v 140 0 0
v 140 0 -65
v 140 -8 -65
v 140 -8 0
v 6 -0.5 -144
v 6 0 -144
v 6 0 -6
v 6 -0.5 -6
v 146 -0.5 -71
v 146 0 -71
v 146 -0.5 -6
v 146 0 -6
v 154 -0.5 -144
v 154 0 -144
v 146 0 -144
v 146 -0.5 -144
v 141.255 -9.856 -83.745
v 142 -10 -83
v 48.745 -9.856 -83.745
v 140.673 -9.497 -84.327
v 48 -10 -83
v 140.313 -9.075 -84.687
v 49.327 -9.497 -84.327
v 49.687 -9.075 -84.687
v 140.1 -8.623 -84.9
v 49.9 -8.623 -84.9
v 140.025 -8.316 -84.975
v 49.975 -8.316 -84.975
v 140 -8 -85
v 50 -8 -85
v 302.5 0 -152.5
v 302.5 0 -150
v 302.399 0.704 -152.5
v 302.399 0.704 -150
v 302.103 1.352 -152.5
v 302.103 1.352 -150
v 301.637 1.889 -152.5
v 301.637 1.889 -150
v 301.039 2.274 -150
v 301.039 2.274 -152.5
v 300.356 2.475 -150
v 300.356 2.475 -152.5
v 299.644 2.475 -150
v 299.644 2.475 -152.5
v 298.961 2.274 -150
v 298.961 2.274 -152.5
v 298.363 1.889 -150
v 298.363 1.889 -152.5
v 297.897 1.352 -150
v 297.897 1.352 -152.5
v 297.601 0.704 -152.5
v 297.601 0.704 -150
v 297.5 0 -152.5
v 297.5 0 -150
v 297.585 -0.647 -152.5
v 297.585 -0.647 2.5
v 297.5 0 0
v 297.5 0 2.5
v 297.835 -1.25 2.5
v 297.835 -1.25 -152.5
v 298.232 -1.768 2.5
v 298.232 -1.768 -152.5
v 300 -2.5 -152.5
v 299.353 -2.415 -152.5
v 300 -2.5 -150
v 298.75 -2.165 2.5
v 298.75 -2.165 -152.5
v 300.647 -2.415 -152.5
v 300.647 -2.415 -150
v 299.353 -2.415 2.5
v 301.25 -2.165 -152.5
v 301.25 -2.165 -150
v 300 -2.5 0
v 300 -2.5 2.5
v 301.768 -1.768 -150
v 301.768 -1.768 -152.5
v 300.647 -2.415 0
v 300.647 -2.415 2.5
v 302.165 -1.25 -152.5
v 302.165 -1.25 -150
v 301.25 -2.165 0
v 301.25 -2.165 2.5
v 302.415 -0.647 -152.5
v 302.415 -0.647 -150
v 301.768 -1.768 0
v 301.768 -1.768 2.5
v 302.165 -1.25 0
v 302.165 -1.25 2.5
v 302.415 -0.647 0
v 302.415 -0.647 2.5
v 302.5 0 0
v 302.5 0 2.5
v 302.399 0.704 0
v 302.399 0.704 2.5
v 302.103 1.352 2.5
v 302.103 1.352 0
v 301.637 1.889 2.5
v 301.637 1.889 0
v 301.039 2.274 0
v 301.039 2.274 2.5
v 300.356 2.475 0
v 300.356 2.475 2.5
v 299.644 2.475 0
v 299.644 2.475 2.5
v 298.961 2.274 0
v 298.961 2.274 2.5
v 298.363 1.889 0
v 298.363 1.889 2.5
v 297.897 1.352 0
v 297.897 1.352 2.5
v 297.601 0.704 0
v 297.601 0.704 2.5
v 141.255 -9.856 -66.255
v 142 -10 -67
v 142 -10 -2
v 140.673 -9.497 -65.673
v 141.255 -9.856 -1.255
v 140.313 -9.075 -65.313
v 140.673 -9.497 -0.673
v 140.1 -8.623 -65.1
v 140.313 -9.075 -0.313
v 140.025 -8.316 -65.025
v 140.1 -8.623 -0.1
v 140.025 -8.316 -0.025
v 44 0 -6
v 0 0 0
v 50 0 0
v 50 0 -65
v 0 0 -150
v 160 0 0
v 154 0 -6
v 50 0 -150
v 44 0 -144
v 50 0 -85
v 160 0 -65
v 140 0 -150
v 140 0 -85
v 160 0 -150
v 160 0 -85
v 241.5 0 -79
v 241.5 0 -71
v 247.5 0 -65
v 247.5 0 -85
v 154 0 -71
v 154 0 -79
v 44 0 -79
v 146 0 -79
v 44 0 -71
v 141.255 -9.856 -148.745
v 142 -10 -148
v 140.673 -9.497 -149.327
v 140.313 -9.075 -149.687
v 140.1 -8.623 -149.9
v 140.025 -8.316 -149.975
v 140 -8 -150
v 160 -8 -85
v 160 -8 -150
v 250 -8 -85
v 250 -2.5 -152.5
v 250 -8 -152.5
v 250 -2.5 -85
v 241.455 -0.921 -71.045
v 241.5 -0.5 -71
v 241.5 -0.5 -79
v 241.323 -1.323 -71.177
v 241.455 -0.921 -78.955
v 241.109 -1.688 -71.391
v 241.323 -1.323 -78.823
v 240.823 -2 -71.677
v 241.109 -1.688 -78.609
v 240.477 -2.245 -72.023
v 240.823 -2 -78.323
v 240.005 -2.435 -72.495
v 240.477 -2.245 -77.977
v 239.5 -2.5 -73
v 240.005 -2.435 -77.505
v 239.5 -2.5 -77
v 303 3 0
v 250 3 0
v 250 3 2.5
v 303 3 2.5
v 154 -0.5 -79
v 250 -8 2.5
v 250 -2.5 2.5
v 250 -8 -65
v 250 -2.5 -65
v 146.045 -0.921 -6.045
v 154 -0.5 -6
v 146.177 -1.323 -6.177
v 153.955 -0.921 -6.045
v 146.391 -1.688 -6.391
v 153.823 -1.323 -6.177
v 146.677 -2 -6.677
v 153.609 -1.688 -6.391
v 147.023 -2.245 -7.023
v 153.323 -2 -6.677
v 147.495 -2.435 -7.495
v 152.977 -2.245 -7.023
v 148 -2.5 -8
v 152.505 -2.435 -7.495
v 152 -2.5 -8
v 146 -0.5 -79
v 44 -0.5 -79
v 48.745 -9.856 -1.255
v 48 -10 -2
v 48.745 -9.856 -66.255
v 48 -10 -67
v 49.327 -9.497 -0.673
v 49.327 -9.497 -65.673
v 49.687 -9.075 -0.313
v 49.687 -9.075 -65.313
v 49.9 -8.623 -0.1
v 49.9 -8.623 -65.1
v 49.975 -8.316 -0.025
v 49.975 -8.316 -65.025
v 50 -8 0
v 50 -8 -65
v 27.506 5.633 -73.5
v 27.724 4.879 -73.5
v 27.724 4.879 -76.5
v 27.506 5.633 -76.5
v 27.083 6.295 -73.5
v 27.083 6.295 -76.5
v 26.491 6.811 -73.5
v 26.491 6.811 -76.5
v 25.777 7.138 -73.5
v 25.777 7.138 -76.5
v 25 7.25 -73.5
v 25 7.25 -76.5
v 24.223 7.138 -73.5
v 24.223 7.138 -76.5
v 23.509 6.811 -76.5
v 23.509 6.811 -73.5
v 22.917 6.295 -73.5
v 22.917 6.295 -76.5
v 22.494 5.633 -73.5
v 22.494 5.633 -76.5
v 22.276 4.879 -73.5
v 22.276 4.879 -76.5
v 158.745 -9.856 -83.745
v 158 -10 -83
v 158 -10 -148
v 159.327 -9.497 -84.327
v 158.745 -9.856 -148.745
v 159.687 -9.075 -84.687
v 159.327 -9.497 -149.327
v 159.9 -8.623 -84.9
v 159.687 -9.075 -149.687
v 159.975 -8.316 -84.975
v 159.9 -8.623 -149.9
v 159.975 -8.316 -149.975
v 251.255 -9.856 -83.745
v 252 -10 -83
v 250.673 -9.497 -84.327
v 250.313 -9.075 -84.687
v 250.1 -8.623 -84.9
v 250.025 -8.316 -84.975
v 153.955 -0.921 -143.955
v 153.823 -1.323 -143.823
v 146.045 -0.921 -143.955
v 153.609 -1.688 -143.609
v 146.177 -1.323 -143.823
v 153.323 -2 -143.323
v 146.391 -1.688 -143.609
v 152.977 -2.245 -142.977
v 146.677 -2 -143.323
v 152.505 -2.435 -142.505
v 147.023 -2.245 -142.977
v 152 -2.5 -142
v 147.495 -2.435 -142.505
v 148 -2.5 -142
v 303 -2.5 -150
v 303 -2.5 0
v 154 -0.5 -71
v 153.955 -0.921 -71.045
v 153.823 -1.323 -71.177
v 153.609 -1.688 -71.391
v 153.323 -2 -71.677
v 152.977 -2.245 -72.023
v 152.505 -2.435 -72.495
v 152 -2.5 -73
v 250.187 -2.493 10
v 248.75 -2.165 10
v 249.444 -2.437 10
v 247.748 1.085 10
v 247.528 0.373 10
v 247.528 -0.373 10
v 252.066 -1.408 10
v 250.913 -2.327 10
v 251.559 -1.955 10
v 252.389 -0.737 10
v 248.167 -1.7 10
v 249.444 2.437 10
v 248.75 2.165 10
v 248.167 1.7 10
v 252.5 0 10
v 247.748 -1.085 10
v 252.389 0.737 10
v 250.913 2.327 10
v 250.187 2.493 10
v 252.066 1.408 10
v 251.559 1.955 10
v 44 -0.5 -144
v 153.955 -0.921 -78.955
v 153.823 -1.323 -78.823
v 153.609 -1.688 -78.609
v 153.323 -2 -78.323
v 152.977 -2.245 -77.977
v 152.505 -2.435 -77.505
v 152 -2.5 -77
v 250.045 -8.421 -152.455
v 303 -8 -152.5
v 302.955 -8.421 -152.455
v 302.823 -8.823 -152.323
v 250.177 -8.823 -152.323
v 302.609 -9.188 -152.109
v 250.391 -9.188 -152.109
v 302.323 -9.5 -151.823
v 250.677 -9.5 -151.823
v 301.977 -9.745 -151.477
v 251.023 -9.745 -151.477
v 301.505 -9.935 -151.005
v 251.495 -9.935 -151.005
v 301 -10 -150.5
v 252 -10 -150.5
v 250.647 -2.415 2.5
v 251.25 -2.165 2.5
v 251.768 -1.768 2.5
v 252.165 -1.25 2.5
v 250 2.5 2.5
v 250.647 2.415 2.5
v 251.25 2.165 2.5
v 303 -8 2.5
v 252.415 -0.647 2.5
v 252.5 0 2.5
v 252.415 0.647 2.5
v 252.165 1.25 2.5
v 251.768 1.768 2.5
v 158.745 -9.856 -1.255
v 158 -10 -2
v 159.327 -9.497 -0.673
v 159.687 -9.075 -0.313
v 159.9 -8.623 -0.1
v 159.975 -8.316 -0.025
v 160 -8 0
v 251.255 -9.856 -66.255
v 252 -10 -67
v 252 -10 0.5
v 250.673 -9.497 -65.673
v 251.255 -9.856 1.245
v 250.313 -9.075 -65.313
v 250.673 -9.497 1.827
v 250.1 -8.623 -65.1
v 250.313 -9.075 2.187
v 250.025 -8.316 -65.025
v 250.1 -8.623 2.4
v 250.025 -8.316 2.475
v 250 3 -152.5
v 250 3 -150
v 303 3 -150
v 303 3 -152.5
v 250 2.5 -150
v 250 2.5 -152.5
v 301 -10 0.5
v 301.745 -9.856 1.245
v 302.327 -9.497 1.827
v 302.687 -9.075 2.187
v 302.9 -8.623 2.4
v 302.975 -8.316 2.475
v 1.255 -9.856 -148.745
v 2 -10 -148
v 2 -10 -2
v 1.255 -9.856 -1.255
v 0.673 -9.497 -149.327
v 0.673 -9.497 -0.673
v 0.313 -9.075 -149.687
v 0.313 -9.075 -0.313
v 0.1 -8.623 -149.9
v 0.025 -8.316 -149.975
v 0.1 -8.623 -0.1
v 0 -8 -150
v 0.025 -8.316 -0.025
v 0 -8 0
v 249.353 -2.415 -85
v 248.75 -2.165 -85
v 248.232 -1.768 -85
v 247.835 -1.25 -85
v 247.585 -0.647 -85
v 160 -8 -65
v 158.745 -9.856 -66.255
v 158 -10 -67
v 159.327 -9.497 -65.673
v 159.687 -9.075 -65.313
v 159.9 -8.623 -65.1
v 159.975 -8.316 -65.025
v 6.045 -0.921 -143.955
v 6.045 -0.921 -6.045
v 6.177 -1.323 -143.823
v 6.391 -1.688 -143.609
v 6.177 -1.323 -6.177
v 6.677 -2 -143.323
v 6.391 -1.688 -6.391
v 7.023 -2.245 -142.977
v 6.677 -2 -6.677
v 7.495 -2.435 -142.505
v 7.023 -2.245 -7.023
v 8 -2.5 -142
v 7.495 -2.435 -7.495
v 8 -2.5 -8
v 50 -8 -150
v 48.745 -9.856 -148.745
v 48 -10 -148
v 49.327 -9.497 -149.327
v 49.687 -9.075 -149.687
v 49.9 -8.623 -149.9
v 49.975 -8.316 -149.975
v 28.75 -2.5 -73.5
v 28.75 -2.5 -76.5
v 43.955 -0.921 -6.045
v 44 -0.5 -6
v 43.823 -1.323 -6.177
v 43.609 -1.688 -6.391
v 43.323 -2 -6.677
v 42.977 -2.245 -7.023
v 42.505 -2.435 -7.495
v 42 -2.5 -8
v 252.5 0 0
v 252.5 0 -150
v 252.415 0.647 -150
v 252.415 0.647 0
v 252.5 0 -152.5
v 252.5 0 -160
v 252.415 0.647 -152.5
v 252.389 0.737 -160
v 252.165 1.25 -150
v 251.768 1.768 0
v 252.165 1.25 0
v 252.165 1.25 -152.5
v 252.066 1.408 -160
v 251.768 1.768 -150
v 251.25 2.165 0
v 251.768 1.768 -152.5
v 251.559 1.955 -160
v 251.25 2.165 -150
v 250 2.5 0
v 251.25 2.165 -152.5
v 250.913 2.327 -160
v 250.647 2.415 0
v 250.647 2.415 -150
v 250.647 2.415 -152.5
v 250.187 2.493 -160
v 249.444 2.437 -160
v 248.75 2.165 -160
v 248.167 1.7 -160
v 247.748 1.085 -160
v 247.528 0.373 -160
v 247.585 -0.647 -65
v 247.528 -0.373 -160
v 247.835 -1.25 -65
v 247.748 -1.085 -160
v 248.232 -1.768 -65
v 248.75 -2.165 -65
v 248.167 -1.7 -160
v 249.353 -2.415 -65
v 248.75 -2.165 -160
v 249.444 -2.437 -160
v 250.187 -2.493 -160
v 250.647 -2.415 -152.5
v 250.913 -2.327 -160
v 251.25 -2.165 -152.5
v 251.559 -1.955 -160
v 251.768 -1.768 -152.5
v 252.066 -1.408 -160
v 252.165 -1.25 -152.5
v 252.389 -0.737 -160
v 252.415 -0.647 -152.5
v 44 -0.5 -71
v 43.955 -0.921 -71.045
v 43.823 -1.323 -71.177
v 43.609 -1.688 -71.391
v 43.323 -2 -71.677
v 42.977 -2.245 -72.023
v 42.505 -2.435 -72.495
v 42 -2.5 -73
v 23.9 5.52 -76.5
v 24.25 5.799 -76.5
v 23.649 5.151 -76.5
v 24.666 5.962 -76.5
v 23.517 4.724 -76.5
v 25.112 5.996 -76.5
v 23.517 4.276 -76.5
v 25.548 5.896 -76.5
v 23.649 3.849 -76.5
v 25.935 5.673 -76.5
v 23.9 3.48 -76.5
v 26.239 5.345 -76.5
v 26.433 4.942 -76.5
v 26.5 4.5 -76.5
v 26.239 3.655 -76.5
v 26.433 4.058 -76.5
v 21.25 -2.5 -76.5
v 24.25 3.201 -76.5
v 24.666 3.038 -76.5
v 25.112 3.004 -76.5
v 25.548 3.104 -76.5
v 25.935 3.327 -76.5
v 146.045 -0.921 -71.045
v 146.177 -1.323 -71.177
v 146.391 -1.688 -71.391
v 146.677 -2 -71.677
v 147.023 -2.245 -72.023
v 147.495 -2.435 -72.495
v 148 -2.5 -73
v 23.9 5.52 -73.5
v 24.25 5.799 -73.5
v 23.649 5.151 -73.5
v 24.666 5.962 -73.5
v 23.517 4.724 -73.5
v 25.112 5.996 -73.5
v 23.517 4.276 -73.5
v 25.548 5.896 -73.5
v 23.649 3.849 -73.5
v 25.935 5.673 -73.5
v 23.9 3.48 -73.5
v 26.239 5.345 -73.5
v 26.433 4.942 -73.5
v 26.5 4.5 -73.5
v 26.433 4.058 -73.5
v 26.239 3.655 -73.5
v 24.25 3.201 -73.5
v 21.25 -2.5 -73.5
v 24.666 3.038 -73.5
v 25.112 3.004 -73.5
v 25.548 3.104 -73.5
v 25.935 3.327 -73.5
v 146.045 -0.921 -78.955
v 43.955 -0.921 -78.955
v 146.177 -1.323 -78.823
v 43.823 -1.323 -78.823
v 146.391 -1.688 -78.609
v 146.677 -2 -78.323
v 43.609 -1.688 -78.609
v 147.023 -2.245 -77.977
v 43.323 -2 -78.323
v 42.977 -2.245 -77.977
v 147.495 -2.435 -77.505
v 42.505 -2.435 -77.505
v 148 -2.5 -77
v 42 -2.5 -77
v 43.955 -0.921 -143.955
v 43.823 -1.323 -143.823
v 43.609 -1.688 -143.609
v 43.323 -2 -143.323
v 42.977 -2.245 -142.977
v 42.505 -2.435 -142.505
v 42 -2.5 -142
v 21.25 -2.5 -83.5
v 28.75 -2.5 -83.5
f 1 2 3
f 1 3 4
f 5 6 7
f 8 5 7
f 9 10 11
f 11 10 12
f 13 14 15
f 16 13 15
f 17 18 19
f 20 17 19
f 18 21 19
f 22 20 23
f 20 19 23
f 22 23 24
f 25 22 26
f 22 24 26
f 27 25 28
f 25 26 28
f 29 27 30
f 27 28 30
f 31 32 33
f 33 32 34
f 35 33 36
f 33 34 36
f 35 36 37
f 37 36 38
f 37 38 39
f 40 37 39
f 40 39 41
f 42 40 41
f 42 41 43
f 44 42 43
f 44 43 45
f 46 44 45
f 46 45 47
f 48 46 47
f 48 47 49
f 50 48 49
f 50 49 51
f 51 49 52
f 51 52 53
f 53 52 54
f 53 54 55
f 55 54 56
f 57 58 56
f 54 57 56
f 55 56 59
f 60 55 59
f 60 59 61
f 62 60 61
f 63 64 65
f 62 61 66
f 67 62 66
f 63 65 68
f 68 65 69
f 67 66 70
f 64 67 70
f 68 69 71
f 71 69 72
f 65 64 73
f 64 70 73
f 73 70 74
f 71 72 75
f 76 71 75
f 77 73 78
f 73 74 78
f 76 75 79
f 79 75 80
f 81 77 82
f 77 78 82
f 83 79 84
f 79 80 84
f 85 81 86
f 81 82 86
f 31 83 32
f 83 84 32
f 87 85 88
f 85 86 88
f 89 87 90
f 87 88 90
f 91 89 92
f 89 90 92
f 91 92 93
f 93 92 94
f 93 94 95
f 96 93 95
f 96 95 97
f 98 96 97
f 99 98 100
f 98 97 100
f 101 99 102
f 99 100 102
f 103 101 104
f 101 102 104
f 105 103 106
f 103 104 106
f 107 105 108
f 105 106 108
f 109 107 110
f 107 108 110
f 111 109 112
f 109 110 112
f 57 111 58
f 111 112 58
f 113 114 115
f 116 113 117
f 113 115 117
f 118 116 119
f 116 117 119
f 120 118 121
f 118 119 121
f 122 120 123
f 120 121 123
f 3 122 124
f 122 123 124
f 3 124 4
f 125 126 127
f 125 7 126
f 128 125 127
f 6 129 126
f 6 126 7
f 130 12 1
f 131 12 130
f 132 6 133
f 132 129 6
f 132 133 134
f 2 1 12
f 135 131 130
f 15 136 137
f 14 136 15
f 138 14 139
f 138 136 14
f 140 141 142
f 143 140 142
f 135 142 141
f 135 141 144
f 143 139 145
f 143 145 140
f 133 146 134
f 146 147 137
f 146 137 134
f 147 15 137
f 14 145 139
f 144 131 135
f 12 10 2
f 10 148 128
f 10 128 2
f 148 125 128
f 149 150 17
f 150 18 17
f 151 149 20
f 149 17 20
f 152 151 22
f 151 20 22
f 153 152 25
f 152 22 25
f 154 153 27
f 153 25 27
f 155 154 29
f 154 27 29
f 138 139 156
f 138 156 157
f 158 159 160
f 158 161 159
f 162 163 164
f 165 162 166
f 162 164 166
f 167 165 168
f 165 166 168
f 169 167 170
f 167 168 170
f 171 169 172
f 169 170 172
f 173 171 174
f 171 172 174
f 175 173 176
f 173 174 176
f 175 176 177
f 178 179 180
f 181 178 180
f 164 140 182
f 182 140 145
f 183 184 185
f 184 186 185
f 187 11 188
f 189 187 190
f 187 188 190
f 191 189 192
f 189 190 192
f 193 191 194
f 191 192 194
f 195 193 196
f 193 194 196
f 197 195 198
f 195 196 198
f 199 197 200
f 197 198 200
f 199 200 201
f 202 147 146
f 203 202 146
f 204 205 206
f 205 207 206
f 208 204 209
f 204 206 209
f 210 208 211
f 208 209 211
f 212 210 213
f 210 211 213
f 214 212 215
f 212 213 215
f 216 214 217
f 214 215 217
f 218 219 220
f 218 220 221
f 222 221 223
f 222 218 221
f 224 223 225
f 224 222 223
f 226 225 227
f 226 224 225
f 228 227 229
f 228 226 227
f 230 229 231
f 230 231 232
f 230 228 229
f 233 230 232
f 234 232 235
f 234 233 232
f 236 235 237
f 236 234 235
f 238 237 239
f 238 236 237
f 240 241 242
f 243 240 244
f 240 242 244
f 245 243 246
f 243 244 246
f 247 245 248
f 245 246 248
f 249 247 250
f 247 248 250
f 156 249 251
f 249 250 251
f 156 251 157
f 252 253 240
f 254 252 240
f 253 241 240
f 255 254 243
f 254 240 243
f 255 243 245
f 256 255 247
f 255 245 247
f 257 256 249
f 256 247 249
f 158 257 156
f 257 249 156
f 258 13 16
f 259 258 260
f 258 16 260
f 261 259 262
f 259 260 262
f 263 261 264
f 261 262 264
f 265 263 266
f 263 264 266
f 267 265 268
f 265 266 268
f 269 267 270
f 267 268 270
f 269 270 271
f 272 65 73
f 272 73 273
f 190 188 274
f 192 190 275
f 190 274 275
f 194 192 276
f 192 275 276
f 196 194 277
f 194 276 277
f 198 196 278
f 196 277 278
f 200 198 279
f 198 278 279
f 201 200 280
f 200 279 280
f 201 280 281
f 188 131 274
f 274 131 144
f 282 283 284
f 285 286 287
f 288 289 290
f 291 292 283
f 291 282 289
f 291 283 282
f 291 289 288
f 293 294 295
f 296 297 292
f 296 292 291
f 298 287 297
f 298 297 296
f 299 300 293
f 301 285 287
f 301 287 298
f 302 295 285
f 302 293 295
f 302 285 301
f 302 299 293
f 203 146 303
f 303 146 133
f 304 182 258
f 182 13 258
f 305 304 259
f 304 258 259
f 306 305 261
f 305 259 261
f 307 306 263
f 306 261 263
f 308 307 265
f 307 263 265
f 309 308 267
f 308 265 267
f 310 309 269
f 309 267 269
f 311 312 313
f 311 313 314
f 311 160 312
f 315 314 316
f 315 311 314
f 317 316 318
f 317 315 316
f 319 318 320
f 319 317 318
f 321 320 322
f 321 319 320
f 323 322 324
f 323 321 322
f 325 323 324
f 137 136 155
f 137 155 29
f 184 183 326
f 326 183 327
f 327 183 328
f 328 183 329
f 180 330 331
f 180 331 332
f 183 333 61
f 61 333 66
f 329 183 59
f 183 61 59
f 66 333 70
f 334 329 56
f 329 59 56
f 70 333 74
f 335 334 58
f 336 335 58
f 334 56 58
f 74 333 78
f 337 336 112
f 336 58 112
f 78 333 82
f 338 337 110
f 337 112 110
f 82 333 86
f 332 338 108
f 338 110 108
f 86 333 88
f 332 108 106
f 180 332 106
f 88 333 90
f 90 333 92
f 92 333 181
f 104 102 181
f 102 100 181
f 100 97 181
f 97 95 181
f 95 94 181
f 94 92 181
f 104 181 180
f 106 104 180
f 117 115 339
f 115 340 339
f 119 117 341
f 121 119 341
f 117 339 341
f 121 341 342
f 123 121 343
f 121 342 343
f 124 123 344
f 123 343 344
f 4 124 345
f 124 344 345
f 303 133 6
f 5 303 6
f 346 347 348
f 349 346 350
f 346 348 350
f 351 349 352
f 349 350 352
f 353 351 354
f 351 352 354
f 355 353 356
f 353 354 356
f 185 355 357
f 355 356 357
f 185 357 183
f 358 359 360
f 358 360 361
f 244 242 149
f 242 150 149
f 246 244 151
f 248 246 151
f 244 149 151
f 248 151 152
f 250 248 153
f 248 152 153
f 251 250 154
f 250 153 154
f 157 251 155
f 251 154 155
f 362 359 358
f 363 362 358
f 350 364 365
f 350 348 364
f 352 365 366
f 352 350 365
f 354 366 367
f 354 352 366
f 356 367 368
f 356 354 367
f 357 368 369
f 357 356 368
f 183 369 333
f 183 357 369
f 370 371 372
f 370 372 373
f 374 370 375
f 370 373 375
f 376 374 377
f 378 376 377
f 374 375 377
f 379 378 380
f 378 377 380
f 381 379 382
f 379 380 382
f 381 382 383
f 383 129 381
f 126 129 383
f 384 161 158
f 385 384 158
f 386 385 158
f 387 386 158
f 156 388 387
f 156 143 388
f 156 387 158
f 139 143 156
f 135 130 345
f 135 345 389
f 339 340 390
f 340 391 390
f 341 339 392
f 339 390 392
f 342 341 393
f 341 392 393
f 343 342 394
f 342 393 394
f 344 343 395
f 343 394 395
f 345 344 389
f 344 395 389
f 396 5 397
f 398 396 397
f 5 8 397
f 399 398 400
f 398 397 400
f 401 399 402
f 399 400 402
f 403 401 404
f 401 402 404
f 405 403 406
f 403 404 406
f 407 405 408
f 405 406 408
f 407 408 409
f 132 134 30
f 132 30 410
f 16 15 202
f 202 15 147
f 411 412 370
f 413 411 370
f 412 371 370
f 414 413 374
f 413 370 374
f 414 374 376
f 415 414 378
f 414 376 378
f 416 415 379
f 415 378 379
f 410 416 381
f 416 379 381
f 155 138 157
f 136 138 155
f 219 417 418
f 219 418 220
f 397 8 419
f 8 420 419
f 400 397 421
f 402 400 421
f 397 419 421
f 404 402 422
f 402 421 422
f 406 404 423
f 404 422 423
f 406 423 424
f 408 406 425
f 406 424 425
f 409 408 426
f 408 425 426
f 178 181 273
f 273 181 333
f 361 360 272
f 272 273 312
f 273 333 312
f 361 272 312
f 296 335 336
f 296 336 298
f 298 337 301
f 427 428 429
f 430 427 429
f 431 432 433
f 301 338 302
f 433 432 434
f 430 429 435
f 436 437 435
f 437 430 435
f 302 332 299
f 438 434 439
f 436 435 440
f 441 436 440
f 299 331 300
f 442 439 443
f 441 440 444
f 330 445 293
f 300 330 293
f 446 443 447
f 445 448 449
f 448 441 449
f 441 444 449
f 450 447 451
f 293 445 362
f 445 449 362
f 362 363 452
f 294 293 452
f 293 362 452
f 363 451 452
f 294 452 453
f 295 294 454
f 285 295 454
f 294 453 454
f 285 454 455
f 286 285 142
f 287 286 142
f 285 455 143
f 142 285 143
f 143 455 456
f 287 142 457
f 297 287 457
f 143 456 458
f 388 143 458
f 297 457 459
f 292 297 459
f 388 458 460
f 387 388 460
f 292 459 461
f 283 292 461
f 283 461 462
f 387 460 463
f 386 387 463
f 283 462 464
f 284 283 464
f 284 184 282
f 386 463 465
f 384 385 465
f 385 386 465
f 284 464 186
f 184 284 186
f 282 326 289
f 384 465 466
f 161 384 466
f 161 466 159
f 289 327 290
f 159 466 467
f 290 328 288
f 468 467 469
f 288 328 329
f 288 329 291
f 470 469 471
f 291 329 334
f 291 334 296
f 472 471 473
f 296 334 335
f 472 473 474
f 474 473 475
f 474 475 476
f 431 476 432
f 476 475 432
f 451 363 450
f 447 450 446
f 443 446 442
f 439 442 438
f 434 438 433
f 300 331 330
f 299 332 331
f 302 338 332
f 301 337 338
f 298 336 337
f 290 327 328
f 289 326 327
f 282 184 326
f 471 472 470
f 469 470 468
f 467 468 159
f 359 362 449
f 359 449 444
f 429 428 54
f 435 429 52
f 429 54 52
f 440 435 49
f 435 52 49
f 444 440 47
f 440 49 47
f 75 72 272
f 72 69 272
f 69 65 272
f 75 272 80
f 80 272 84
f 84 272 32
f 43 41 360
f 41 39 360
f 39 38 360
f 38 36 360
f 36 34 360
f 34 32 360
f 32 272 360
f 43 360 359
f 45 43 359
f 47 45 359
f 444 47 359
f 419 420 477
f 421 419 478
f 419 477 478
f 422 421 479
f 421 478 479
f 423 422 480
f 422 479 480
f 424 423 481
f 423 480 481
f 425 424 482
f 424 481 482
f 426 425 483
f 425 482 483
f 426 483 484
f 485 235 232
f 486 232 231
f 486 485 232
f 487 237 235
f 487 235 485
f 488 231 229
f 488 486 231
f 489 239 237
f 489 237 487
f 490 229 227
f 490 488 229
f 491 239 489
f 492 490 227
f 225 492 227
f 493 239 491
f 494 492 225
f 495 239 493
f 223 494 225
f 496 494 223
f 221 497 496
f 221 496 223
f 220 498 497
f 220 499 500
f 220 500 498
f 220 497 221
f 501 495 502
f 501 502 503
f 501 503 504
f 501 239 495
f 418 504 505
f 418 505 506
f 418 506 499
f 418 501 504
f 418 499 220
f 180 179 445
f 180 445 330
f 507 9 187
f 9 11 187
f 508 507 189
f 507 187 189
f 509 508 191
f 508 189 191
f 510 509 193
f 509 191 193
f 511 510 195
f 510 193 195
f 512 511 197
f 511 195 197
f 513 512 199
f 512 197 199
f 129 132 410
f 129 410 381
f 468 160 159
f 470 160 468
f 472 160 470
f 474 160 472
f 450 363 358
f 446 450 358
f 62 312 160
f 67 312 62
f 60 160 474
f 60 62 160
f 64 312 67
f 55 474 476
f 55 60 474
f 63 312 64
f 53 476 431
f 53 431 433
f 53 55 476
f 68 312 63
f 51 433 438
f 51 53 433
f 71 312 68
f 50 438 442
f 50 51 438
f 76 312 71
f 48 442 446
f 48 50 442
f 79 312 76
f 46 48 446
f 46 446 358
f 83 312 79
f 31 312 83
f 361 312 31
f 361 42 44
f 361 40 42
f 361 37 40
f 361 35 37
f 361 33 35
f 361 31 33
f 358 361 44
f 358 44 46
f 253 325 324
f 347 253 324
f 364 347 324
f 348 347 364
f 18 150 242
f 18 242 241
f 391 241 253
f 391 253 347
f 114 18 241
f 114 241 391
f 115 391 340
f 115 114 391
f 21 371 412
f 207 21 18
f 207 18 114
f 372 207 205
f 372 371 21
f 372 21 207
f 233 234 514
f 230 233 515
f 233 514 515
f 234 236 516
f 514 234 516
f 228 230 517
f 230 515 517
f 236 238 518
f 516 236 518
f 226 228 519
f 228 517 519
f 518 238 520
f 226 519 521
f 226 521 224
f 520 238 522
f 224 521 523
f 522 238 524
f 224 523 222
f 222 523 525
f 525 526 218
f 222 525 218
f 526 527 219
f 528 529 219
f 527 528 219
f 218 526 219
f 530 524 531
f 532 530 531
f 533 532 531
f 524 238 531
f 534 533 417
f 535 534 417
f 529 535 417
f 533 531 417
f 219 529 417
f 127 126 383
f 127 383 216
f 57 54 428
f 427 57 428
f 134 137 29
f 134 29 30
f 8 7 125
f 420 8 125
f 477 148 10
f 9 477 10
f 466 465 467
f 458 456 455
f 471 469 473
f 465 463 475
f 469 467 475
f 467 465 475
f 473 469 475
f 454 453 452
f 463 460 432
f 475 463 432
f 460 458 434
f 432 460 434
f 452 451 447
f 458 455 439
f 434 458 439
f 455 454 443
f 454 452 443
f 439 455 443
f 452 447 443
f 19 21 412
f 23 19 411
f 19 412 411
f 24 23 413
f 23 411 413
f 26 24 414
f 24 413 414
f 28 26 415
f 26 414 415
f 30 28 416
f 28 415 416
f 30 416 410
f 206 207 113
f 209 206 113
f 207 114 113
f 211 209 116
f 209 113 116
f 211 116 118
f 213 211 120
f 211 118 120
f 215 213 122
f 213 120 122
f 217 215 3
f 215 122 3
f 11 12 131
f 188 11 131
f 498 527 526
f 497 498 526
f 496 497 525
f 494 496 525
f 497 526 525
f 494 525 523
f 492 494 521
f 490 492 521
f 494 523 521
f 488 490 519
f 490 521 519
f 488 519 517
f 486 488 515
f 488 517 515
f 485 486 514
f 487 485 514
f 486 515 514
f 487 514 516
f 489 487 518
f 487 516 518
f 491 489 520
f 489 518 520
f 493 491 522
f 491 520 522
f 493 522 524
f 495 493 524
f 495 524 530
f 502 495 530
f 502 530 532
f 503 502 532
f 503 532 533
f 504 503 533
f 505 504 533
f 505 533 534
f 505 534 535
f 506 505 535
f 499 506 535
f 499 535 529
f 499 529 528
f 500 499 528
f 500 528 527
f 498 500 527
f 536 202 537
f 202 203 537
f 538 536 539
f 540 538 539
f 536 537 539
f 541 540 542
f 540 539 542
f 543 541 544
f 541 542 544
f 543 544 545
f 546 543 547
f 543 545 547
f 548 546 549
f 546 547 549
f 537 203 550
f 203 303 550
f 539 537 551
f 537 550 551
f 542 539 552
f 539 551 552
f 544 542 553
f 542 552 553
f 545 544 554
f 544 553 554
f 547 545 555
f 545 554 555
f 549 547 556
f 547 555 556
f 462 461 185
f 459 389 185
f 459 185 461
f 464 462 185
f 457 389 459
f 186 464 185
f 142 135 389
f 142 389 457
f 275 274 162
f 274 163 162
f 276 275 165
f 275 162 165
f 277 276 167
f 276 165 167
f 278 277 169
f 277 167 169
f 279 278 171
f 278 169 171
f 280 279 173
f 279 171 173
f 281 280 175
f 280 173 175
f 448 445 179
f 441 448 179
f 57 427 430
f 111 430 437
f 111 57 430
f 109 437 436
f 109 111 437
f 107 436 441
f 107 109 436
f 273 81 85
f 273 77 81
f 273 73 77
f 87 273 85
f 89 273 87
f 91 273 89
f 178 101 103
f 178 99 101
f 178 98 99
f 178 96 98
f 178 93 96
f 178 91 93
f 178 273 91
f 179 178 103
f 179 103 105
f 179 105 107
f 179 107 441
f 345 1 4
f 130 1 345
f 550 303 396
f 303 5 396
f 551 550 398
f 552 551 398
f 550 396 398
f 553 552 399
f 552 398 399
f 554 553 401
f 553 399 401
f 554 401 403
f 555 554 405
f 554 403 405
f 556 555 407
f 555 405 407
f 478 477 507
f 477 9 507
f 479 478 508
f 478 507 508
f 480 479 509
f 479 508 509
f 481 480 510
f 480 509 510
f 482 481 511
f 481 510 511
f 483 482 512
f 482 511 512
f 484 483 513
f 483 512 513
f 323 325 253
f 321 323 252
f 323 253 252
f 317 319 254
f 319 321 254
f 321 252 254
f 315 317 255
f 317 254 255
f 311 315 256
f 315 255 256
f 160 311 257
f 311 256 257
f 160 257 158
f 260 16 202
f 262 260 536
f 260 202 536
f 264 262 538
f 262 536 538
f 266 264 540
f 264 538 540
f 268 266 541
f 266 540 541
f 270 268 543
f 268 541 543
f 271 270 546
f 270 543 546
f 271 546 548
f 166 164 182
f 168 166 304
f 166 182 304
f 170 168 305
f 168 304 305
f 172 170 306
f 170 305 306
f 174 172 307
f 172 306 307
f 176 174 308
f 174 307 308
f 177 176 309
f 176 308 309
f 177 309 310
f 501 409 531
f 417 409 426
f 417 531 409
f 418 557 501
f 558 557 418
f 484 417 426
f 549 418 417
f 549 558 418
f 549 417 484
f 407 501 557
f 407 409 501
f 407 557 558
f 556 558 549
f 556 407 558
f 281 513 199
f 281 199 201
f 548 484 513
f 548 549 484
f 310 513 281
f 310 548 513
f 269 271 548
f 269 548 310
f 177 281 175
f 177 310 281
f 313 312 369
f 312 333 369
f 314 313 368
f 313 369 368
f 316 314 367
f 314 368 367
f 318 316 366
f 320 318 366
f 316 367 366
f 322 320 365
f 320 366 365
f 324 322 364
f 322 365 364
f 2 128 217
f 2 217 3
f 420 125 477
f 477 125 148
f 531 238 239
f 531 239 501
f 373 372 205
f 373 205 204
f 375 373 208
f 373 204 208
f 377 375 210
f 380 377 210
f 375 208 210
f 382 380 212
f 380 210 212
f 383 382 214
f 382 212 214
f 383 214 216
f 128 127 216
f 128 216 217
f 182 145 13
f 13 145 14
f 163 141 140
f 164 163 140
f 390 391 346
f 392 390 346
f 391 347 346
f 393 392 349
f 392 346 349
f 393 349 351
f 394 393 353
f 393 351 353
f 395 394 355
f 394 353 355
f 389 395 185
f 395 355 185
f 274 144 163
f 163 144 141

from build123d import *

# Parameters (mm, degrees)
BOSS_EXTRUDE1_DEPTH      = 10
BOSS_EXTRUDE2_DEPTH      = 10
BOSS_EXTRUDE2_DEPTH_BACK = 160
SKETCH4_R                = 2.5
CUT_EXTRUDE2_DEPTH       = 2.5
FILLET1_R                = 2
BOSS_EXTRUDE6_DEPTH      = 2.5
BOSS_EXTRUDE7_DEPTH      = 3
SKETCH8_W                = 2.5
SKETCH8_H                = 3
BOSS_EXTRUDE8_DEPTH      = 47
SKETCH9_R                = 2.5
CUT_EXTRUDE3_DEPTH       = 344.969838794
SKETCH10_W               = 3
SKETCH10_H               = 150
BOSS_EXTRUDE9_DEPTH      = 0.5
FILLET2_R                = 2
SKETCH11_W               = 7.5
SKETCH11_H               = 3
BOSS_EXTRUDE10_DEPTH     = 10
SKETCH12_R               = 1.5
CUT_EXTRUDE4_DEPTH       = 10


with BuildPart() as part:
    # Sketch3 → Boss-Extrude1 (new body)
    with BuildSketch(Plane(origin=(0, 0, 0), x_dir=(1, 0, 0), z_dir=(0, 1, 0))):
        Polygon((50, 85), (50, 150), (0, 150), (0, 0), (50, 0), (50, 65), (140, 65), (140, 0), (160, 0), (160, 65), (250, 65), (250, 0), (300, 0), (300, 150), (250, 150), (250, 85), (160, 85), (160, 150), (140, 150), (140, 85), align=None)
    extrude(amount=-BOSS_EXTRUDE1_DEPTH)

    # Sketch4 → Boss-Extrude2 (add, two sides: drawn at the far end of the back side and taken through both)
    with BuildSketch(Plane.XY.offset(-BOSS_EXTRUDE2_DEPTH_BACK)):
        with Locations((250, 0)):
            Circle(SKETCH4_R)
    extrude(amount=BOSS_EXTRUDE2_DEPTH + BOSS_EXTRUDE2_DEPTH_BACK)

    # Sketch5 → Cut-Extrude2 (cut)
    with BuildSketch(Plane(origin=(0, 0, 0), x_dir=(1, 0, 0), z_dir=(0, 1, 0))):
        Polygon((44, 144), (6, 144), (6, 6), (44, 6), (44, 71), (146, 71), (146, 6), (154, 6), (154, 71), (241.5, 71), (241.5, 79), (154, 79), (154, 144), (146, 144), (146, 79), (44, 79), align=None)
    extrude(amount=-CUT_EXTRUDE2_DEPTH, mode=Mode.SUBTRACT)

    # Fillet1
    fillet1_edges = [part.edges().sort_by_distance(p)[0] for p in [
        (95, -2.5, -71),
        (44, -2.5, -38.5),
        (25, -2.5, -6),
        (6, -2.5, -75),
        (25, -2.5, -144),
        (44, -2.5, -111.5),
        (95, -2.5, -79),
        (146, -2.5, -111.5),
        (150, -2.5, -144),
        (154, -2.5, -111.5),
        (197.75, -2.5, -79),
        (241.5, -2.5, -75),
        (197.75, -2.5, -71),
        (154, -2.5, -38.5),
        (150, -2.5, -6),
        (146, -2.5, -38.5),
    ]]
    fillet(fillet1_edges, radius=FILLET1_R)

    # Sketch6 → Boss-Extrude6 (add)
    with BuildSketch(Plane.XY):
        with BuildLine():
            Line((297, 3), (297, 0))
            Line((297, 0), (297.5, 0))
            ThreePointArc((297.5, 0), (300, 2.5), (302.5, 0))
            ThreePointArc((302.5, 0), (301.767766953, -1.767766953), (300, -2.5))
            Line((300, -2.5), (300, -3))
            Line((300, -3), (303, -3))
            Line((303, -3), (303, 3))
            Line((303, 3), (297, 3))
        make_face()
        with BuildLine():
            Line((297.5, 0), (297, 0))
            Line((297, 0), (252.5, 0))
            ThreePointArc((252.5, 0), (251.767766953, -1.767766953), (250, -2.5))
            Line((250, -2.5), (250, -10))
            Line((250, -10), (300, -10))
            Line((300, -10), (300, -3))
            Line((300, -3), (300, -2.5))
            ThreePointArc((300, -2.5), (298.232233047, -1.767766953), (297.5, 0))
        make_face()
    boss_extrude6 = extrude(amount=BOSS_EXTRUDE6_DEPTH)

    # Mirror2: Boss-Extrude6 across plane
    add(boss_extrude6.mirror(Plane.XY.offset(-75)))

    # Sketch7 → Boss-Extrude7 (add)
    with BuildSketch(Plane(origin=(300, 0, 0), x_dir=(0, 0, -1), z_dir=(1, 0, 0))):
        Polygon((0, -3), (150, -3), (152.5, -3), (152.5, -10), (-2.5, -10), (-2.5, -3), align=None)
    extrude(amount=BOSS_EXTRUDE7_DEPTH)

    # Sketch8 → Boss-Extrude8 (add)
    with BuildSketch(Plane.ZY.offset(-297)):
        with Locations((1.25, 1.5)):
            Rectangle(SKETCH8_W, SKETCH8_H)
    boss_extrude8 = extrude(amount=BOSS_EXTRUDE8_DEPTH)

    # Mirror3: Boss-Extrude8 across plane
    add(boss_extrude8.mirror(Plane.XY.offset(-75)))

    # Sketch9 → Cut-Extrude3 (cut, through all)
    with BuildSketch(Plane.XY.offset(2.5)):
        with Locations((300, 0)):
            Circle(SKETCH9_R)
    extrude(amount=-CUT_EXTRUDE3_DEPTH, mode=Mode.SUBTRACT)

    # Sketch10 → Boss-Extrude9 (add)
    with BuildSketch(Plane(origin=(0, -3, 0), x_dir=(1, 0, 0), z_dir=(0, 1, 0))):
        with Locations((301.5, 75)):
            Rectangle(SKETCH10_W, SKETCH10_H)
    extrude(amount=BOSS_EXTRUDE9_DEPTH)

    # Fillet2
    fillet2_edges = [part.edges().sort_by_distance(p)[0] for p in [
        (50, -10, -32.5),
        (95, -10, -65),
        (275, -10, 2.5),
        (140, -10, -32.5),
        (275, -10, -152.5),
        (150, -10, 0),
        (303, -10, -75),
        (160, -10, -32.5),
        (205, -10, -65),
        (250, -10, -32.5),
        (250, -10, -117.5),
        (25, -10, 0),
        (205, -10, -85),
        (160, -10, -117.5),
        (150, -10, -150),
        (140, -10, -117.5),
        (95, -10, -85),
        (50, -10, -117.5),
        (25, -10, -150),
        (0, -10, -75),
    ]]
    fillet(fillet2_edges, radius=FILLET2_R)

    # Sketch11 → Boss-Extrude10 (add)
    with BuildSketch(Plane(origin=(0, -2.5, 0), x_dir=(1, 0, 0), z_dir=(0, 1, 0))):
        with Locations((25, 75)):
            Rectangle(SKETCH11_W, SKETCH11_H)
    extrude(amount=BOSS_EXTRUDE10_DEPTH)

    # Sketch12 → Cut-Extrude4 (cut)
    with BuildSketch(Plane.XY.offset(-73.5)):
        with Locations((25, 4.5)):
            Circle(SKETCH12_R)
        with BuildLine():
            Line((28.75, -2.5), (27.723784263, 4.878812998))
            ThreePointArc((27.723784263, 4.878812998), (25, 7.25), (22.276215737, 4.878812998))
            Line((22.276215737, 4.878812998), (21.25, -2.5))
            Line((21.25, -2.5), (21.25, 7.5))
            Line((21.25, 7.5), (28.75, 7.5))
            Line((28.75, 7.5), (28.75, -2.5))
        make_face()
    extrude(amount=-CUT_EXTRUDE4_DEPTH, mode=Mode.SUBTRACT)


solid = part.part
